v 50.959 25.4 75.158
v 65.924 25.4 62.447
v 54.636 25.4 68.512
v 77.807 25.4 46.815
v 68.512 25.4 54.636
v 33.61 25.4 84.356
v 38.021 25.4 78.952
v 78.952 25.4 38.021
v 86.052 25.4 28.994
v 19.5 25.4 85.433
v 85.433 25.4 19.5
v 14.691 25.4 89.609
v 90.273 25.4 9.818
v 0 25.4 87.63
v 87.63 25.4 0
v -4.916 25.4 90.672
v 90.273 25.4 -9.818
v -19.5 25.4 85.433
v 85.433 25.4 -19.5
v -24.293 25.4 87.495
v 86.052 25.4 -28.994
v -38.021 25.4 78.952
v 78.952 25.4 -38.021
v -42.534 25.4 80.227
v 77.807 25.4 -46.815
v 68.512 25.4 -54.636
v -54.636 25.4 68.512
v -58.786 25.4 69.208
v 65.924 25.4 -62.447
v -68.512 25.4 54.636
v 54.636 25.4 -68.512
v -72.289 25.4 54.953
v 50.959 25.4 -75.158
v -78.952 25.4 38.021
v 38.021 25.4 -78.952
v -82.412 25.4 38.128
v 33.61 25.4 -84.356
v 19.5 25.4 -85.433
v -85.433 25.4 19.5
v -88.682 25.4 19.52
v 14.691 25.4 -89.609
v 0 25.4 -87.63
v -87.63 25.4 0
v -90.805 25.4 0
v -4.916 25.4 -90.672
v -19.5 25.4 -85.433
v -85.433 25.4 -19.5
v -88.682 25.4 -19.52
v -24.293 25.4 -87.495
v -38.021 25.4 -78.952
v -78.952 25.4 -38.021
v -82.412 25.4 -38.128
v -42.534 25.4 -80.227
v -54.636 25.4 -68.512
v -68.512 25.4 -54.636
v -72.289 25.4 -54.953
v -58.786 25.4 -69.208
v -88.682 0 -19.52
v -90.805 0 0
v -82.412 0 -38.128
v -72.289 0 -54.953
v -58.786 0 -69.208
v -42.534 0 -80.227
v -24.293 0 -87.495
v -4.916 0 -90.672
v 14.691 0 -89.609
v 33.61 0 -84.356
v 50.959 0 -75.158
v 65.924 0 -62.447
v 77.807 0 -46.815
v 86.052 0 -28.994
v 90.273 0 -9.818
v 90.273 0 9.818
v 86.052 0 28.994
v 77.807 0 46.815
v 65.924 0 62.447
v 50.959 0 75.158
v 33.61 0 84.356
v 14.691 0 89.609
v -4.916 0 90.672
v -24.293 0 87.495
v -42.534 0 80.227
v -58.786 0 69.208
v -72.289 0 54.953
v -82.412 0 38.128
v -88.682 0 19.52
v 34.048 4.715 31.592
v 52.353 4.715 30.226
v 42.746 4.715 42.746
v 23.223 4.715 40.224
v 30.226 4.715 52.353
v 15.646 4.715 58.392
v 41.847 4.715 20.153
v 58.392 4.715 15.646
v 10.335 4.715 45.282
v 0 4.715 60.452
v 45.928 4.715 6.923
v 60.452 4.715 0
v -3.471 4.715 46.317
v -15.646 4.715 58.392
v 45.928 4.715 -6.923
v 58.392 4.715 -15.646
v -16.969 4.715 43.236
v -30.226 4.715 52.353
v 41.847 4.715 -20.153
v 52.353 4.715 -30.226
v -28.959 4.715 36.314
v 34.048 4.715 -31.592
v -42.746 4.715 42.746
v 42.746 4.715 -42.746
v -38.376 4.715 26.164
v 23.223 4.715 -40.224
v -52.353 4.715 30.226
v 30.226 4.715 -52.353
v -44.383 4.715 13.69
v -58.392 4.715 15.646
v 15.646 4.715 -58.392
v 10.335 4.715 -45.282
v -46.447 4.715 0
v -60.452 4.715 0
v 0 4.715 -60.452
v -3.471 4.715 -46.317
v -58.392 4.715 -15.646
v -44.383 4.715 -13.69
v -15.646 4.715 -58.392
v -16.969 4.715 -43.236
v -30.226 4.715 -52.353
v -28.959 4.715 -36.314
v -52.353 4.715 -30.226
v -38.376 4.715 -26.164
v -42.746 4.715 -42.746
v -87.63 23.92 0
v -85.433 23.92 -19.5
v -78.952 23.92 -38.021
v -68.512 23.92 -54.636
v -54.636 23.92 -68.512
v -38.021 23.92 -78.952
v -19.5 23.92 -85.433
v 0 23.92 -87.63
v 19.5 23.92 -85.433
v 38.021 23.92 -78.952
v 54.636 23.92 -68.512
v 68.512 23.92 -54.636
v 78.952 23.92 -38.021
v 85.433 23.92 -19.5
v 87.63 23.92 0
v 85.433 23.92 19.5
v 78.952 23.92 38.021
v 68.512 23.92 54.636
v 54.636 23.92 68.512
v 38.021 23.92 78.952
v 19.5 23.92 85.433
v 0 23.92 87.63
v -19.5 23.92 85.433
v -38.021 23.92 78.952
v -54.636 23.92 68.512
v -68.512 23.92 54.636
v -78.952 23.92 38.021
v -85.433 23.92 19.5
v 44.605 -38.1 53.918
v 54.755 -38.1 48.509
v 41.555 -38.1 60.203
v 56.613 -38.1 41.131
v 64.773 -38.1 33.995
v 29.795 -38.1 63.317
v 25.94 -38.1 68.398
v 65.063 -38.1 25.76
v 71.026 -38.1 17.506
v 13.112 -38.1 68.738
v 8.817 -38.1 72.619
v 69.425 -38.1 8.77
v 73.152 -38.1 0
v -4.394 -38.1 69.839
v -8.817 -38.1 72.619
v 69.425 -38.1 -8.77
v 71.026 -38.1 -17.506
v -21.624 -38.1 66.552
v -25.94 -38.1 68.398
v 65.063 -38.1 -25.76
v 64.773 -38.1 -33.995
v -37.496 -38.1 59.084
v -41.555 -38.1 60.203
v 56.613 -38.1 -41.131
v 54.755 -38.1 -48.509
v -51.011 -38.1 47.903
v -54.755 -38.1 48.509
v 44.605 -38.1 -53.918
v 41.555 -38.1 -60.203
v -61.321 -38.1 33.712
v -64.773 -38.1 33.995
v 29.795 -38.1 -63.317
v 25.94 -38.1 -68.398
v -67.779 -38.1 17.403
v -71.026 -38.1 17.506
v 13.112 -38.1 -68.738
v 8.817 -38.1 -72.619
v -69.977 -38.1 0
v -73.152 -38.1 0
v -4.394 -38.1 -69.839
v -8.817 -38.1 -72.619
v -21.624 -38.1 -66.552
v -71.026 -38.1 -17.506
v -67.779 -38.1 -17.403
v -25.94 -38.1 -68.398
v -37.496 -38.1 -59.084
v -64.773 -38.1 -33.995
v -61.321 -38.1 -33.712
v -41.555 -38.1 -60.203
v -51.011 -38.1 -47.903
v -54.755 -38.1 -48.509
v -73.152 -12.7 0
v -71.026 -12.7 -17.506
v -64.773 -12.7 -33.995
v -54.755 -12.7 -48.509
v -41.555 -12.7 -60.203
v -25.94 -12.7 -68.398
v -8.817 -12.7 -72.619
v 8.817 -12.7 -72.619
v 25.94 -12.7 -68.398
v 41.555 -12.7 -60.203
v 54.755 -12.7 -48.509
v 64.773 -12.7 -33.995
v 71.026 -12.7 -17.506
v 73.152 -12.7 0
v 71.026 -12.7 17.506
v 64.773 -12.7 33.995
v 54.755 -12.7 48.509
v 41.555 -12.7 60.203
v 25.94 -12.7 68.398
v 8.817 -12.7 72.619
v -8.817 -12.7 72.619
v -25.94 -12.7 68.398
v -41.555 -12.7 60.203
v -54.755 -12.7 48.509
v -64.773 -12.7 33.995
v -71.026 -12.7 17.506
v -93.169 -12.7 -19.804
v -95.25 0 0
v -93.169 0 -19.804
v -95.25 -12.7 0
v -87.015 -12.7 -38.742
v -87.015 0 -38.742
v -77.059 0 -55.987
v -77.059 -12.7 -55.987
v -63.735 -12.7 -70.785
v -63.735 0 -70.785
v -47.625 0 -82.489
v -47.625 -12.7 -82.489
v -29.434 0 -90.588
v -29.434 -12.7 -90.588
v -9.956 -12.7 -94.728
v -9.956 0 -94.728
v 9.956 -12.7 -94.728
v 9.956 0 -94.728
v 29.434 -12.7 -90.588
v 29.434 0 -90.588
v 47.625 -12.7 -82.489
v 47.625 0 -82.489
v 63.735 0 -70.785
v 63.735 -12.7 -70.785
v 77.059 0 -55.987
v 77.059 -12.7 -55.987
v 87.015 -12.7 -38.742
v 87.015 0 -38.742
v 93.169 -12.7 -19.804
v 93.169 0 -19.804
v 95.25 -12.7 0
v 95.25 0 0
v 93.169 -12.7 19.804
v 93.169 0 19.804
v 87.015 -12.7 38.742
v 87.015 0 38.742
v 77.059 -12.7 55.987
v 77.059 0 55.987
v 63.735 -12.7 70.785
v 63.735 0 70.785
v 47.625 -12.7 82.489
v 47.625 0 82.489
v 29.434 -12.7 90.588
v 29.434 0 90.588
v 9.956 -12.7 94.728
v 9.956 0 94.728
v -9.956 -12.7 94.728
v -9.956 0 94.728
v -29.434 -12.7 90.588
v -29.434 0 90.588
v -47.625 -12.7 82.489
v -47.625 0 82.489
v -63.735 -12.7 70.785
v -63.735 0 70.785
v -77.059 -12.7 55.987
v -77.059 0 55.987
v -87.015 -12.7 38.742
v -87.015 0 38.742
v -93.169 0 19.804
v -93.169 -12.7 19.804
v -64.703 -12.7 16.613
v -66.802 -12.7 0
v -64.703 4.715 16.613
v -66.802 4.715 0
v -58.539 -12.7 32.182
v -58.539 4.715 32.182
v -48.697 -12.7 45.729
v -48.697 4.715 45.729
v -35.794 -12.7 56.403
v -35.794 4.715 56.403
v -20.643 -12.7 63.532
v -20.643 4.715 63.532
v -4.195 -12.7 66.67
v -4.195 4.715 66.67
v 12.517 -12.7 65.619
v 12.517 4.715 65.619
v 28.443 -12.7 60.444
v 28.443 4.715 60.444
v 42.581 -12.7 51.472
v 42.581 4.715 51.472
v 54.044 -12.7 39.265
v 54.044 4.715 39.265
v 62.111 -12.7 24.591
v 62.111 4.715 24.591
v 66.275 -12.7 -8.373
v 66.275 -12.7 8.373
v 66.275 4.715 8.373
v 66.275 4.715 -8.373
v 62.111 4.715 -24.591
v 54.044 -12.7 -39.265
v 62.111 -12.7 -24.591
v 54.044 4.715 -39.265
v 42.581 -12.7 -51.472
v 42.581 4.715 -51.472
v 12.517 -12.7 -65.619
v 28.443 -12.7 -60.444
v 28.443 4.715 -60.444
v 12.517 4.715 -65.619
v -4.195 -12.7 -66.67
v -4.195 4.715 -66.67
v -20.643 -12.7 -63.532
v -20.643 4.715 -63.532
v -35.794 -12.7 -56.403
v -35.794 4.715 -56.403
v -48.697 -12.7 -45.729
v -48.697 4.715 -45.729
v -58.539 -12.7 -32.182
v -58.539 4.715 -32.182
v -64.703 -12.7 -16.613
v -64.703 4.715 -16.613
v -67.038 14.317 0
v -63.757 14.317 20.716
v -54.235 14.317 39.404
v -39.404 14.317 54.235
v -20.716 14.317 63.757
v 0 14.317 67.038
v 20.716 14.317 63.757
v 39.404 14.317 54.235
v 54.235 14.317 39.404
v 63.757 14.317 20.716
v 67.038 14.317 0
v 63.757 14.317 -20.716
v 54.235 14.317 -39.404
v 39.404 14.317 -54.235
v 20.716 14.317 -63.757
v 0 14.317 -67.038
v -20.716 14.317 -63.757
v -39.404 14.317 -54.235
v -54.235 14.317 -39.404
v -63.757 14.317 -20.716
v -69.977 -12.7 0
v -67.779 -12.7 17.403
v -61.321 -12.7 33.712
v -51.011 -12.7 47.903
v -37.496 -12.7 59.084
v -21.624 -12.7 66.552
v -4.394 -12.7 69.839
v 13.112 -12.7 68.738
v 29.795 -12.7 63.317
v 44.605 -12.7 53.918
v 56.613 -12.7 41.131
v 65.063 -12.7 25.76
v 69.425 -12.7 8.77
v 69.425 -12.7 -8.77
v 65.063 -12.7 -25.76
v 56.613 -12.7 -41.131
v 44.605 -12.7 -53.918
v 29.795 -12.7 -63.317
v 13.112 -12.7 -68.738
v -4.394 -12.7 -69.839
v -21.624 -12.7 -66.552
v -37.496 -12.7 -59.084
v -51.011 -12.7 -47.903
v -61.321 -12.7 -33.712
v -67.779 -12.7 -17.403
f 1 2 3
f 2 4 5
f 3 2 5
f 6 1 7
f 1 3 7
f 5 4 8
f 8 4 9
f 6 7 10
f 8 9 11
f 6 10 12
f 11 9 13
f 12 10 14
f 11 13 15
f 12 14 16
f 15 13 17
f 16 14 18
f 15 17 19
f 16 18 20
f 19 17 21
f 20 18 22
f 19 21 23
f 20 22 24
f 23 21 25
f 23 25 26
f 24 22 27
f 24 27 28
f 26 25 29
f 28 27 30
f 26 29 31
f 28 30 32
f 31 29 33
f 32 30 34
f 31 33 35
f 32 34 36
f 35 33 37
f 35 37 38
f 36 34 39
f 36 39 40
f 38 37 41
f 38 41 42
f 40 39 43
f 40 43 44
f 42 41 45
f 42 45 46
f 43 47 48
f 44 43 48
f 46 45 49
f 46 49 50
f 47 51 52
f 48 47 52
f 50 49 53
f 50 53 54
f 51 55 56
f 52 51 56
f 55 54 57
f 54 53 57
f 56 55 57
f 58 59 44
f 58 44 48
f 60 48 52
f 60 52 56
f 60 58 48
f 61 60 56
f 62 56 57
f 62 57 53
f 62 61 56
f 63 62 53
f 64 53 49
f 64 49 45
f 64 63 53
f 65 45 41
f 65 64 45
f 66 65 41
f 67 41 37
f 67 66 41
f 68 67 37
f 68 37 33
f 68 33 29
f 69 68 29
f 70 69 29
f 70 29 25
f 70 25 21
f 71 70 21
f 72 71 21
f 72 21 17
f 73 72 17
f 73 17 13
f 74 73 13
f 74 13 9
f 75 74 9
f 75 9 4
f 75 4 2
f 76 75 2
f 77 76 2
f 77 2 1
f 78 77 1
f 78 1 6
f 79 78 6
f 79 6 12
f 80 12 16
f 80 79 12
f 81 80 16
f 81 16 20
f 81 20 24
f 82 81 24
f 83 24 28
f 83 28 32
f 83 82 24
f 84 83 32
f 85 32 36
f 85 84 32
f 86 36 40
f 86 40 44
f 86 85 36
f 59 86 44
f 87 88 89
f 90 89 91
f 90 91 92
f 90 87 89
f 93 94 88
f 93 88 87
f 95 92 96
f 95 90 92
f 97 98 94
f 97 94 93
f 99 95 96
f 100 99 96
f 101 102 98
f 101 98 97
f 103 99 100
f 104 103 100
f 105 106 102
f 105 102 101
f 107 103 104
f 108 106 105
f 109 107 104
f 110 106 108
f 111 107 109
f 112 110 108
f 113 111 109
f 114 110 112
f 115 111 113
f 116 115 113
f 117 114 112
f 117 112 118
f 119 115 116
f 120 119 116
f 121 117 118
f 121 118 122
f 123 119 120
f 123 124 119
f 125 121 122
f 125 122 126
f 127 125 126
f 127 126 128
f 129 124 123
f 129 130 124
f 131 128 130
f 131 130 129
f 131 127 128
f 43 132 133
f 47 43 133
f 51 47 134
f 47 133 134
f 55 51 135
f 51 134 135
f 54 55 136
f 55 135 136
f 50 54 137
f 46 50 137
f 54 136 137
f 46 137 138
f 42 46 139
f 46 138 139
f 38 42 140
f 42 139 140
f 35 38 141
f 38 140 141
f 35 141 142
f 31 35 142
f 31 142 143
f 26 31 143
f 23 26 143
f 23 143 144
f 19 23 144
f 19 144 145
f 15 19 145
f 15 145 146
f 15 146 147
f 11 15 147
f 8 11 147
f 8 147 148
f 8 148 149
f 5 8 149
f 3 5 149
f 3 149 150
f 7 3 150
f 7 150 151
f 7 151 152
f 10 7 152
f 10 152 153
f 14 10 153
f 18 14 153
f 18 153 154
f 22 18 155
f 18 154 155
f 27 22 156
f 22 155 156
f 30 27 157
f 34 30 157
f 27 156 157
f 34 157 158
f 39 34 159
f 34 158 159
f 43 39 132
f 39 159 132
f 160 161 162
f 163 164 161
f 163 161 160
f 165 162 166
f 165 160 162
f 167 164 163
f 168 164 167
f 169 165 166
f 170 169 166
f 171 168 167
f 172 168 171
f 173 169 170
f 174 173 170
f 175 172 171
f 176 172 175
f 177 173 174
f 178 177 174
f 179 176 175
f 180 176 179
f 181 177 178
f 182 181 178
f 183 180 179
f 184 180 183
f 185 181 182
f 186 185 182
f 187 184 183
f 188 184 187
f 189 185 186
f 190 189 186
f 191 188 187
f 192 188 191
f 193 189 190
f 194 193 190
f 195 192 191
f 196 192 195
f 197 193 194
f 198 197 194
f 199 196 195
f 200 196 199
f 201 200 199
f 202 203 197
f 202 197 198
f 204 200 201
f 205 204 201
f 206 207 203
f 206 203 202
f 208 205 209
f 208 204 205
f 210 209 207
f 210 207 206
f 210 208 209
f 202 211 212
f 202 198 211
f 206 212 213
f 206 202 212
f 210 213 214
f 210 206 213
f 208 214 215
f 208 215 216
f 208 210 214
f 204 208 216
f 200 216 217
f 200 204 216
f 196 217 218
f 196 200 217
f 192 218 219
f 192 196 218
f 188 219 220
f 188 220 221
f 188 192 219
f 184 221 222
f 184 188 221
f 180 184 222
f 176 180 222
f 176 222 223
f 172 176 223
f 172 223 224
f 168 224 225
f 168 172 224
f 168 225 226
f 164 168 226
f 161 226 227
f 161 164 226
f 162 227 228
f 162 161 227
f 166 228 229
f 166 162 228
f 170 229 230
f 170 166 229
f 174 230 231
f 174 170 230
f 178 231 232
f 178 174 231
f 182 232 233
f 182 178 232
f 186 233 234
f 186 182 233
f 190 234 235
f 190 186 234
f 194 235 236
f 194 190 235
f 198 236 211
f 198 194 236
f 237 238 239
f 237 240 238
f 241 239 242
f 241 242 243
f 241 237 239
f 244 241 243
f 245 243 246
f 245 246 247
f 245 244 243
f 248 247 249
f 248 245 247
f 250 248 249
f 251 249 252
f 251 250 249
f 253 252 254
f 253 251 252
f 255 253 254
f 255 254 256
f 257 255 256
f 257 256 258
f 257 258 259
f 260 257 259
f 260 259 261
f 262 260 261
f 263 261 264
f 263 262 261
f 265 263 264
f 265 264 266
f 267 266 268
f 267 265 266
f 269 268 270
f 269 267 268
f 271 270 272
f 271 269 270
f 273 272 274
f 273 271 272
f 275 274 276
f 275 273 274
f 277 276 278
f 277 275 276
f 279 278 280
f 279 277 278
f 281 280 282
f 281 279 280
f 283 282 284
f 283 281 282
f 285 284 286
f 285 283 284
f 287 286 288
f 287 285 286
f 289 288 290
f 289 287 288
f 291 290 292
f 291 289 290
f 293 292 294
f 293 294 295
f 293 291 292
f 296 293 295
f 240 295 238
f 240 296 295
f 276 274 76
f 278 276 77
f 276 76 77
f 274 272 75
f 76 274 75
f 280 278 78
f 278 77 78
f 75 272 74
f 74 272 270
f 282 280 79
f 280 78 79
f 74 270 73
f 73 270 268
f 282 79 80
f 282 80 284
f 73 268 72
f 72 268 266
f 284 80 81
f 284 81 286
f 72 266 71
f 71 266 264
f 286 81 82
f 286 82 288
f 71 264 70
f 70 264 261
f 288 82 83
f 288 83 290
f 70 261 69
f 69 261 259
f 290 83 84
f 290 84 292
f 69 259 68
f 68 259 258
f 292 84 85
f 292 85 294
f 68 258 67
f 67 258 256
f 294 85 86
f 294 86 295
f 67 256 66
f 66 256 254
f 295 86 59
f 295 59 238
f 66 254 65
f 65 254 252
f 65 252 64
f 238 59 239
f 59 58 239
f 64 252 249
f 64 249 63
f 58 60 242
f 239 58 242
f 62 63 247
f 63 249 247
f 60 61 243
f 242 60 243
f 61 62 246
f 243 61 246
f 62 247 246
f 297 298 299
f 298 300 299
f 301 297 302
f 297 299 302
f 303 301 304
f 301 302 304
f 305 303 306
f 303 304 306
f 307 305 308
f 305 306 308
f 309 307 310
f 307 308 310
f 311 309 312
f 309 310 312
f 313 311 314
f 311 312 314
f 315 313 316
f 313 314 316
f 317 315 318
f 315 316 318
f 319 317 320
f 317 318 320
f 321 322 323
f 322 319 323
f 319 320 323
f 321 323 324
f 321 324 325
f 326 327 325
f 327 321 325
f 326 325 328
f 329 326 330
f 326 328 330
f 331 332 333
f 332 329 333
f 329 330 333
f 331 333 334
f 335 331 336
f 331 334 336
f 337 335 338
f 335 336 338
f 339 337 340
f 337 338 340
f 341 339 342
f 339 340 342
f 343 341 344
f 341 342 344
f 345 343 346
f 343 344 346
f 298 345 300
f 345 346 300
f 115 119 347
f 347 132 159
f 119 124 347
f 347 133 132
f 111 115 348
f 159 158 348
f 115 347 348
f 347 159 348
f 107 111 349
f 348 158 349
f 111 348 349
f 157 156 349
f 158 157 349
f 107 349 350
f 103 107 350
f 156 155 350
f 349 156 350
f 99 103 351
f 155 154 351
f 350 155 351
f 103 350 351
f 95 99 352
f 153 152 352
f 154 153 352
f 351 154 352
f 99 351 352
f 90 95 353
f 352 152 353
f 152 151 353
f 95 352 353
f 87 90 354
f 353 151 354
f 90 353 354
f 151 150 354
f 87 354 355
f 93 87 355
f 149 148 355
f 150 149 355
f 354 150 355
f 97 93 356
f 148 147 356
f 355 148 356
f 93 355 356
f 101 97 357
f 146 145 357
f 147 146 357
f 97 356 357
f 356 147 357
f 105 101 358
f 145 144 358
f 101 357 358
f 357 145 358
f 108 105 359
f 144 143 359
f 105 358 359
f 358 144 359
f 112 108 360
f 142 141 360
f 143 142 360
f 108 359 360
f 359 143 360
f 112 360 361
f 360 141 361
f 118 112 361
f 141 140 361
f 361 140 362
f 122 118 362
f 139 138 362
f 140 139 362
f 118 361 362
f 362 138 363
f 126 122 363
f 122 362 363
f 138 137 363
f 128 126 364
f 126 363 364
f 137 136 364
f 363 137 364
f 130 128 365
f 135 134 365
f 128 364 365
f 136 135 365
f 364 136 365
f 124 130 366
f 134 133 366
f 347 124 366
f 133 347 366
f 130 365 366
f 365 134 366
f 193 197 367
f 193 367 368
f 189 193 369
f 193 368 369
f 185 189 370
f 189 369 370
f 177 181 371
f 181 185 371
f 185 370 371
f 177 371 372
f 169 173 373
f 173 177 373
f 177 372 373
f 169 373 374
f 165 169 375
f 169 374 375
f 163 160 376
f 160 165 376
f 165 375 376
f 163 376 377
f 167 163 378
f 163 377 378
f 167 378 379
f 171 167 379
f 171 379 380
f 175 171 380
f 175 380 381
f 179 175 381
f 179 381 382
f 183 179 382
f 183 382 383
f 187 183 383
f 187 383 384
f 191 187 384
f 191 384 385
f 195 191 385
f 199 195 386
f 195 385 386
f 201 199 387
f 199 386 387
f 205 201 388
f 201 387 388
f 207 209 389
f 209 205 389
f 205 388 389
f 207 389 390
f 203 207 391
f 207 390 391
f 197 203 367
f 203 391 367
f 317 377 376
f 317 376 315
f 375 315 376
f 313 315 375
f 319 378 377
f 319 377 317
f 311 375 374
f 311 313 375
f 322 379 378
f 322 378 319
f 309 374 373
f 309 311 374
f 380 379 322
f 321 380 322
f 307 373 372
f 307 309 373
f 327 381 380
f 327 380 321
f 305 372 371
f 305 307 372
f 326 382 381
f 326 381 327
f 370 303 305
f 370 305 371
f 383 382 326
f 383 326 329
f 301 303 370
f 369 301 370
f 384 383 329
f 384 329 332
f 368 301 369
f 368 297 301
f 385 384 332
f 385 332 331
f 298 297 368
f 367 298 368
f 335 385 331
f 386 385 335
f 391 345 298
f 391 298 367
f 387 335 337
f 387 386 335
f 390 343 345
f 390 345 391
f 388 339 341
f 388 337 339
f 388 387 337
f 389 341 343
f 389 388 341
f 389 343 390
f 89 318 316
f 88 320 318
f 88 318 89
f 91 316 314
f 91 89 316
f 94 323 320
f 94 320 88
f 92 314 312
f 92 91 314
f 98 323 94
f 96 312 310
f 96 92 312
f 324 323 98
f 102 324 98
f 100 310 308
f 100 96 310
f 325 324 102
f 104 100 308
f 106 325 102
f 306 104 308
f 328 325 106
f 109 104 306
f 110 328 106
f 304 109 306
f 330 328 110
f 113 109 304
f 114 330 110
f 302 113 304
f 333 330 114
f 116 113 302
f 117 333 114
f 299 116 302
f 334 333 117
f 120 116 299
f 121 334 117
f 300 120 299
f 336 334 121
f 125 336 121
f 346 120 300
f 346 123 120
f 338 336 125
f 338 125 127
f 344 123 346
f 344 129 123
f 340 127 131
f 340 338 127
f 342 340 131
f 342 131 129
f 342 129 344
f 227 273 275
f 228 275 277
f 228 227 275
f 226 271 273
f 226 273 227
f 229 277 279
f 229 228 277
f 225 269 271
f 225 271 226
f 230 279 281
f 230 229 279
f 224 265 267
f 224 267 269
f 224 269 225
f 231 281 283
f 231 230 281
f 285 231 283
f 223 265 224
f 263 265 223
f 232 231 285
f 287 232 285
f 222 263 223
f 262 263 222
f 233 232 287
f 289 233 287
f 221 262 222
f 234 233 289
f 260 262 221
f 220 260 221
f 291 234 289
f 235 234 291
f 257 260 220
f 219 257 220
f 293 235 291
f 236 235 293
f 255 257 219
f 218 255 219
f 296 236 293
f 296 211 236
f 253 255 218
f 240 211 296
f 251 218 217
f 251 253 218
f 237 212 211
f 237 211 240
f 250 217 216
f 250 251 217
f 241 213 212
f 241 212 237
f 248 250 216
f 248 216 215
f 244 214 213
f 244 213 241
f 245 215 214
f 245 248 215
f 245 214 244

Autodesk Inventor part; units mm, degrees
ref_plane "YZ Plane" through (0, 0, 0) normal (1, 0, 0) x (0, 1, 0)
ref_plane "XZ Plane" through (0, 0, 0) normal (0, 1, 0) x (-1, 0, 0)
ref_plane "XY Plane" through (0, 0, 0) normal (0, 0, 1) x (1, 0, 0)
sketch "Sketch1" plane through (0, 0, 0) normal (0, 0, 1) x (1, 0, 0)
  line L0 (0, 25.4) -> (-28.702, 25.4) construction
  line L1 (0, 25.4) -> (-95.25, 25.4) construction
  line L2 (-95.25, 25.4) -> (-90.805, 25.4) construction
  line L3 (-90.805, 25.4) -> (-90.805, 22.4389) construction
  line L4 (-90.805, 0) -> (-95.25, 0)
  line L5 (-28.702, 59.6457) -> (-28.702, -91.9304) construction
  arc A0 (-28.9184, -9.248) -> (-32.3684, -1.8494) centre (-35.052, -7.6045) ccw
  line L6 (-76.2, -185.7054) -> (-28.702, -8.4405)
  line L7 (-90.805, 25.4) -> (-90.805, 0)
  line L8 (-87.63, 23.9195) -> (-32.3684, -1.8494)
  line L9 (-28.702, -7.6045) -> (-60.452, -7.6045) construction
  line L10 (-60.452, -126.9331) -> (-54.102, -126.9331) construction
  line L11 (-54.102, -126.9331) -> (-54.102, -103.2346) construction
  line L12 (-54.102, -103.2346) -> (-60.452, -103.2346)
  line L13 (-60.452, 11.2462) -> (-60.452, 1.7212) construction
  line L14 (-60.452, 11.2462) -> (-60.452, 4.7154) construction
  line L15 (-60.452, 4.7154) -> (-46.4468, 4.7154)
  line L16 (-95.25, 0) -> (-95.25, -12.7) construction
  line L17 (-60.452, -12.7) -> (-73.152, -12.7) construction
  line L18 (-95.25, -12.7) -> (-95.25, -25.4) construction
  line L19 (-95.25, -25.4) -> (-95.25, -88.9) construction
  line L20 (-95.25, -88.9) -> (-82.55, -88.9) construction
  line L21 (-82.55, -88.9) -> (-82.55, -25.4) construction
  line L22 (-95.25, -25.4) -> (-82.55, -25.4)
  line L23 (-82.55, -25.4) -> (-82.55, -88.9)
  line L24 (-82.55, -88.9) -> (-95.25, -88.9)
  line L25 (-95.25, -12.7) -> (-73.152, -12.7)
  line L26 (-73.152, -138.7824) -> (-63.627, -138.7824)
  line L27 (-82.55, -88.9) -> (-82.55, -185.7054)
  line L28 (-82.55, -185.7054) -> (-76.2, -185.7054)
  line L29 (-73.152, -12.7) -> (-73.152, -138.7824)
  line L30 (-88.9, -25.4) -> (-88.9, -31.3436)
  line L31 (-88.9, -31.3436) -> (-95.25, -31.3436)
  line L32 (-95.25, 0) -> (-95.25, -25.4)
  line L33 (-95.25, -31.3436) -> (-95.25, -88.9)
  line L34 (-88.9, -160.3054) -> (-88.9, -221.2532)
  line L35 (-28.9184, -9.248) -> (-85.725, -221.2532)
  line L36 (-85.725, -221.2532) -> (-88.9, -221.2532)
  line L37 (-82.55, -160.3054) -> (-88.9, -160.3054)
  line L38 (-66.802, -38.1) -> (-66.802, 4.7154)
  line L39 (-66.802, 4.7154) -> (-60.452, 4.7154)
  line L40 (-66.802, -38.1) -> (-60.452, -103.2346)
  line L41 (-60.452, 11.2462) -> (-60.452, 4.7154) construction
  line L42 (-60.452, -7.6045) -> (-60.452, -12.7) construction
  line L43 (-60.452, -103.2346) -> (-60.452, -126.9331) construction
  line L44 (0, 59.6457) -> (0, -91.9304) construction
  line L45 (-73.152, -38.1) -> (-69.977, -38.1)
  line L46 (-69.977, -38.1) -> (-69.977, -12.7)
  line L47 (-66.802, -12.7) -> (-69.977, -12.7)
  line L48 (-90.805, 25.4) -> (-87.63, 25.4)
  line L49 (-87.63, 25.4) -> (-87.63, 23.9195)
  point P0 (0, 0)
  point P1 (-95.25, -255.9127)
  point P2 (-88.7095, 22.4389)
  dimension "d0" = 28.702
  dimension "d1" = 95.25
  dimension "d2" = 4.445
  dimension "d5" = 25.4
  dimension "d6" = 25.4
  dimension "d8" = 12.7
  dimension "d12" = 31.75
  dimension "d13" = 6.35
  dimension "d16" = 12.7
  dimension "d17" = 12.7
  dimension "d18" = 12.7
  dimension "d19" = 63.5
  dimension "d20" = 12.7
  dimension "d22" = 9.525
  dimension "d23" = 6.35
  dimension "d25" = 5.9436
  dimension "d27" = 3.175
  dimension "d28" = 6.35
  dimension "d29" = 25.4
  dimension "d30" = 107.95
  dimension "d31" = 6.35
  dimension "d33" = 20.3552
  dimension "d34" = 15
  dimension "d35" = 3.175
  dimension "d36" = 25.4
  dimension "d38" = 3.175
  dimension "d39" = 1.4805
  dimension "d40" = 25
revolve "Revolution1" add sketch "Sketch1" angle 360 about axis through (0, 59.6457, 0) along (0, -1, 0) contours L7 L48 L49 L8 L15 L39 L38 L47 L46 L45 L29 L25 L32 L4
properties part number "phenolic_top" material "Phenolic Resin"
